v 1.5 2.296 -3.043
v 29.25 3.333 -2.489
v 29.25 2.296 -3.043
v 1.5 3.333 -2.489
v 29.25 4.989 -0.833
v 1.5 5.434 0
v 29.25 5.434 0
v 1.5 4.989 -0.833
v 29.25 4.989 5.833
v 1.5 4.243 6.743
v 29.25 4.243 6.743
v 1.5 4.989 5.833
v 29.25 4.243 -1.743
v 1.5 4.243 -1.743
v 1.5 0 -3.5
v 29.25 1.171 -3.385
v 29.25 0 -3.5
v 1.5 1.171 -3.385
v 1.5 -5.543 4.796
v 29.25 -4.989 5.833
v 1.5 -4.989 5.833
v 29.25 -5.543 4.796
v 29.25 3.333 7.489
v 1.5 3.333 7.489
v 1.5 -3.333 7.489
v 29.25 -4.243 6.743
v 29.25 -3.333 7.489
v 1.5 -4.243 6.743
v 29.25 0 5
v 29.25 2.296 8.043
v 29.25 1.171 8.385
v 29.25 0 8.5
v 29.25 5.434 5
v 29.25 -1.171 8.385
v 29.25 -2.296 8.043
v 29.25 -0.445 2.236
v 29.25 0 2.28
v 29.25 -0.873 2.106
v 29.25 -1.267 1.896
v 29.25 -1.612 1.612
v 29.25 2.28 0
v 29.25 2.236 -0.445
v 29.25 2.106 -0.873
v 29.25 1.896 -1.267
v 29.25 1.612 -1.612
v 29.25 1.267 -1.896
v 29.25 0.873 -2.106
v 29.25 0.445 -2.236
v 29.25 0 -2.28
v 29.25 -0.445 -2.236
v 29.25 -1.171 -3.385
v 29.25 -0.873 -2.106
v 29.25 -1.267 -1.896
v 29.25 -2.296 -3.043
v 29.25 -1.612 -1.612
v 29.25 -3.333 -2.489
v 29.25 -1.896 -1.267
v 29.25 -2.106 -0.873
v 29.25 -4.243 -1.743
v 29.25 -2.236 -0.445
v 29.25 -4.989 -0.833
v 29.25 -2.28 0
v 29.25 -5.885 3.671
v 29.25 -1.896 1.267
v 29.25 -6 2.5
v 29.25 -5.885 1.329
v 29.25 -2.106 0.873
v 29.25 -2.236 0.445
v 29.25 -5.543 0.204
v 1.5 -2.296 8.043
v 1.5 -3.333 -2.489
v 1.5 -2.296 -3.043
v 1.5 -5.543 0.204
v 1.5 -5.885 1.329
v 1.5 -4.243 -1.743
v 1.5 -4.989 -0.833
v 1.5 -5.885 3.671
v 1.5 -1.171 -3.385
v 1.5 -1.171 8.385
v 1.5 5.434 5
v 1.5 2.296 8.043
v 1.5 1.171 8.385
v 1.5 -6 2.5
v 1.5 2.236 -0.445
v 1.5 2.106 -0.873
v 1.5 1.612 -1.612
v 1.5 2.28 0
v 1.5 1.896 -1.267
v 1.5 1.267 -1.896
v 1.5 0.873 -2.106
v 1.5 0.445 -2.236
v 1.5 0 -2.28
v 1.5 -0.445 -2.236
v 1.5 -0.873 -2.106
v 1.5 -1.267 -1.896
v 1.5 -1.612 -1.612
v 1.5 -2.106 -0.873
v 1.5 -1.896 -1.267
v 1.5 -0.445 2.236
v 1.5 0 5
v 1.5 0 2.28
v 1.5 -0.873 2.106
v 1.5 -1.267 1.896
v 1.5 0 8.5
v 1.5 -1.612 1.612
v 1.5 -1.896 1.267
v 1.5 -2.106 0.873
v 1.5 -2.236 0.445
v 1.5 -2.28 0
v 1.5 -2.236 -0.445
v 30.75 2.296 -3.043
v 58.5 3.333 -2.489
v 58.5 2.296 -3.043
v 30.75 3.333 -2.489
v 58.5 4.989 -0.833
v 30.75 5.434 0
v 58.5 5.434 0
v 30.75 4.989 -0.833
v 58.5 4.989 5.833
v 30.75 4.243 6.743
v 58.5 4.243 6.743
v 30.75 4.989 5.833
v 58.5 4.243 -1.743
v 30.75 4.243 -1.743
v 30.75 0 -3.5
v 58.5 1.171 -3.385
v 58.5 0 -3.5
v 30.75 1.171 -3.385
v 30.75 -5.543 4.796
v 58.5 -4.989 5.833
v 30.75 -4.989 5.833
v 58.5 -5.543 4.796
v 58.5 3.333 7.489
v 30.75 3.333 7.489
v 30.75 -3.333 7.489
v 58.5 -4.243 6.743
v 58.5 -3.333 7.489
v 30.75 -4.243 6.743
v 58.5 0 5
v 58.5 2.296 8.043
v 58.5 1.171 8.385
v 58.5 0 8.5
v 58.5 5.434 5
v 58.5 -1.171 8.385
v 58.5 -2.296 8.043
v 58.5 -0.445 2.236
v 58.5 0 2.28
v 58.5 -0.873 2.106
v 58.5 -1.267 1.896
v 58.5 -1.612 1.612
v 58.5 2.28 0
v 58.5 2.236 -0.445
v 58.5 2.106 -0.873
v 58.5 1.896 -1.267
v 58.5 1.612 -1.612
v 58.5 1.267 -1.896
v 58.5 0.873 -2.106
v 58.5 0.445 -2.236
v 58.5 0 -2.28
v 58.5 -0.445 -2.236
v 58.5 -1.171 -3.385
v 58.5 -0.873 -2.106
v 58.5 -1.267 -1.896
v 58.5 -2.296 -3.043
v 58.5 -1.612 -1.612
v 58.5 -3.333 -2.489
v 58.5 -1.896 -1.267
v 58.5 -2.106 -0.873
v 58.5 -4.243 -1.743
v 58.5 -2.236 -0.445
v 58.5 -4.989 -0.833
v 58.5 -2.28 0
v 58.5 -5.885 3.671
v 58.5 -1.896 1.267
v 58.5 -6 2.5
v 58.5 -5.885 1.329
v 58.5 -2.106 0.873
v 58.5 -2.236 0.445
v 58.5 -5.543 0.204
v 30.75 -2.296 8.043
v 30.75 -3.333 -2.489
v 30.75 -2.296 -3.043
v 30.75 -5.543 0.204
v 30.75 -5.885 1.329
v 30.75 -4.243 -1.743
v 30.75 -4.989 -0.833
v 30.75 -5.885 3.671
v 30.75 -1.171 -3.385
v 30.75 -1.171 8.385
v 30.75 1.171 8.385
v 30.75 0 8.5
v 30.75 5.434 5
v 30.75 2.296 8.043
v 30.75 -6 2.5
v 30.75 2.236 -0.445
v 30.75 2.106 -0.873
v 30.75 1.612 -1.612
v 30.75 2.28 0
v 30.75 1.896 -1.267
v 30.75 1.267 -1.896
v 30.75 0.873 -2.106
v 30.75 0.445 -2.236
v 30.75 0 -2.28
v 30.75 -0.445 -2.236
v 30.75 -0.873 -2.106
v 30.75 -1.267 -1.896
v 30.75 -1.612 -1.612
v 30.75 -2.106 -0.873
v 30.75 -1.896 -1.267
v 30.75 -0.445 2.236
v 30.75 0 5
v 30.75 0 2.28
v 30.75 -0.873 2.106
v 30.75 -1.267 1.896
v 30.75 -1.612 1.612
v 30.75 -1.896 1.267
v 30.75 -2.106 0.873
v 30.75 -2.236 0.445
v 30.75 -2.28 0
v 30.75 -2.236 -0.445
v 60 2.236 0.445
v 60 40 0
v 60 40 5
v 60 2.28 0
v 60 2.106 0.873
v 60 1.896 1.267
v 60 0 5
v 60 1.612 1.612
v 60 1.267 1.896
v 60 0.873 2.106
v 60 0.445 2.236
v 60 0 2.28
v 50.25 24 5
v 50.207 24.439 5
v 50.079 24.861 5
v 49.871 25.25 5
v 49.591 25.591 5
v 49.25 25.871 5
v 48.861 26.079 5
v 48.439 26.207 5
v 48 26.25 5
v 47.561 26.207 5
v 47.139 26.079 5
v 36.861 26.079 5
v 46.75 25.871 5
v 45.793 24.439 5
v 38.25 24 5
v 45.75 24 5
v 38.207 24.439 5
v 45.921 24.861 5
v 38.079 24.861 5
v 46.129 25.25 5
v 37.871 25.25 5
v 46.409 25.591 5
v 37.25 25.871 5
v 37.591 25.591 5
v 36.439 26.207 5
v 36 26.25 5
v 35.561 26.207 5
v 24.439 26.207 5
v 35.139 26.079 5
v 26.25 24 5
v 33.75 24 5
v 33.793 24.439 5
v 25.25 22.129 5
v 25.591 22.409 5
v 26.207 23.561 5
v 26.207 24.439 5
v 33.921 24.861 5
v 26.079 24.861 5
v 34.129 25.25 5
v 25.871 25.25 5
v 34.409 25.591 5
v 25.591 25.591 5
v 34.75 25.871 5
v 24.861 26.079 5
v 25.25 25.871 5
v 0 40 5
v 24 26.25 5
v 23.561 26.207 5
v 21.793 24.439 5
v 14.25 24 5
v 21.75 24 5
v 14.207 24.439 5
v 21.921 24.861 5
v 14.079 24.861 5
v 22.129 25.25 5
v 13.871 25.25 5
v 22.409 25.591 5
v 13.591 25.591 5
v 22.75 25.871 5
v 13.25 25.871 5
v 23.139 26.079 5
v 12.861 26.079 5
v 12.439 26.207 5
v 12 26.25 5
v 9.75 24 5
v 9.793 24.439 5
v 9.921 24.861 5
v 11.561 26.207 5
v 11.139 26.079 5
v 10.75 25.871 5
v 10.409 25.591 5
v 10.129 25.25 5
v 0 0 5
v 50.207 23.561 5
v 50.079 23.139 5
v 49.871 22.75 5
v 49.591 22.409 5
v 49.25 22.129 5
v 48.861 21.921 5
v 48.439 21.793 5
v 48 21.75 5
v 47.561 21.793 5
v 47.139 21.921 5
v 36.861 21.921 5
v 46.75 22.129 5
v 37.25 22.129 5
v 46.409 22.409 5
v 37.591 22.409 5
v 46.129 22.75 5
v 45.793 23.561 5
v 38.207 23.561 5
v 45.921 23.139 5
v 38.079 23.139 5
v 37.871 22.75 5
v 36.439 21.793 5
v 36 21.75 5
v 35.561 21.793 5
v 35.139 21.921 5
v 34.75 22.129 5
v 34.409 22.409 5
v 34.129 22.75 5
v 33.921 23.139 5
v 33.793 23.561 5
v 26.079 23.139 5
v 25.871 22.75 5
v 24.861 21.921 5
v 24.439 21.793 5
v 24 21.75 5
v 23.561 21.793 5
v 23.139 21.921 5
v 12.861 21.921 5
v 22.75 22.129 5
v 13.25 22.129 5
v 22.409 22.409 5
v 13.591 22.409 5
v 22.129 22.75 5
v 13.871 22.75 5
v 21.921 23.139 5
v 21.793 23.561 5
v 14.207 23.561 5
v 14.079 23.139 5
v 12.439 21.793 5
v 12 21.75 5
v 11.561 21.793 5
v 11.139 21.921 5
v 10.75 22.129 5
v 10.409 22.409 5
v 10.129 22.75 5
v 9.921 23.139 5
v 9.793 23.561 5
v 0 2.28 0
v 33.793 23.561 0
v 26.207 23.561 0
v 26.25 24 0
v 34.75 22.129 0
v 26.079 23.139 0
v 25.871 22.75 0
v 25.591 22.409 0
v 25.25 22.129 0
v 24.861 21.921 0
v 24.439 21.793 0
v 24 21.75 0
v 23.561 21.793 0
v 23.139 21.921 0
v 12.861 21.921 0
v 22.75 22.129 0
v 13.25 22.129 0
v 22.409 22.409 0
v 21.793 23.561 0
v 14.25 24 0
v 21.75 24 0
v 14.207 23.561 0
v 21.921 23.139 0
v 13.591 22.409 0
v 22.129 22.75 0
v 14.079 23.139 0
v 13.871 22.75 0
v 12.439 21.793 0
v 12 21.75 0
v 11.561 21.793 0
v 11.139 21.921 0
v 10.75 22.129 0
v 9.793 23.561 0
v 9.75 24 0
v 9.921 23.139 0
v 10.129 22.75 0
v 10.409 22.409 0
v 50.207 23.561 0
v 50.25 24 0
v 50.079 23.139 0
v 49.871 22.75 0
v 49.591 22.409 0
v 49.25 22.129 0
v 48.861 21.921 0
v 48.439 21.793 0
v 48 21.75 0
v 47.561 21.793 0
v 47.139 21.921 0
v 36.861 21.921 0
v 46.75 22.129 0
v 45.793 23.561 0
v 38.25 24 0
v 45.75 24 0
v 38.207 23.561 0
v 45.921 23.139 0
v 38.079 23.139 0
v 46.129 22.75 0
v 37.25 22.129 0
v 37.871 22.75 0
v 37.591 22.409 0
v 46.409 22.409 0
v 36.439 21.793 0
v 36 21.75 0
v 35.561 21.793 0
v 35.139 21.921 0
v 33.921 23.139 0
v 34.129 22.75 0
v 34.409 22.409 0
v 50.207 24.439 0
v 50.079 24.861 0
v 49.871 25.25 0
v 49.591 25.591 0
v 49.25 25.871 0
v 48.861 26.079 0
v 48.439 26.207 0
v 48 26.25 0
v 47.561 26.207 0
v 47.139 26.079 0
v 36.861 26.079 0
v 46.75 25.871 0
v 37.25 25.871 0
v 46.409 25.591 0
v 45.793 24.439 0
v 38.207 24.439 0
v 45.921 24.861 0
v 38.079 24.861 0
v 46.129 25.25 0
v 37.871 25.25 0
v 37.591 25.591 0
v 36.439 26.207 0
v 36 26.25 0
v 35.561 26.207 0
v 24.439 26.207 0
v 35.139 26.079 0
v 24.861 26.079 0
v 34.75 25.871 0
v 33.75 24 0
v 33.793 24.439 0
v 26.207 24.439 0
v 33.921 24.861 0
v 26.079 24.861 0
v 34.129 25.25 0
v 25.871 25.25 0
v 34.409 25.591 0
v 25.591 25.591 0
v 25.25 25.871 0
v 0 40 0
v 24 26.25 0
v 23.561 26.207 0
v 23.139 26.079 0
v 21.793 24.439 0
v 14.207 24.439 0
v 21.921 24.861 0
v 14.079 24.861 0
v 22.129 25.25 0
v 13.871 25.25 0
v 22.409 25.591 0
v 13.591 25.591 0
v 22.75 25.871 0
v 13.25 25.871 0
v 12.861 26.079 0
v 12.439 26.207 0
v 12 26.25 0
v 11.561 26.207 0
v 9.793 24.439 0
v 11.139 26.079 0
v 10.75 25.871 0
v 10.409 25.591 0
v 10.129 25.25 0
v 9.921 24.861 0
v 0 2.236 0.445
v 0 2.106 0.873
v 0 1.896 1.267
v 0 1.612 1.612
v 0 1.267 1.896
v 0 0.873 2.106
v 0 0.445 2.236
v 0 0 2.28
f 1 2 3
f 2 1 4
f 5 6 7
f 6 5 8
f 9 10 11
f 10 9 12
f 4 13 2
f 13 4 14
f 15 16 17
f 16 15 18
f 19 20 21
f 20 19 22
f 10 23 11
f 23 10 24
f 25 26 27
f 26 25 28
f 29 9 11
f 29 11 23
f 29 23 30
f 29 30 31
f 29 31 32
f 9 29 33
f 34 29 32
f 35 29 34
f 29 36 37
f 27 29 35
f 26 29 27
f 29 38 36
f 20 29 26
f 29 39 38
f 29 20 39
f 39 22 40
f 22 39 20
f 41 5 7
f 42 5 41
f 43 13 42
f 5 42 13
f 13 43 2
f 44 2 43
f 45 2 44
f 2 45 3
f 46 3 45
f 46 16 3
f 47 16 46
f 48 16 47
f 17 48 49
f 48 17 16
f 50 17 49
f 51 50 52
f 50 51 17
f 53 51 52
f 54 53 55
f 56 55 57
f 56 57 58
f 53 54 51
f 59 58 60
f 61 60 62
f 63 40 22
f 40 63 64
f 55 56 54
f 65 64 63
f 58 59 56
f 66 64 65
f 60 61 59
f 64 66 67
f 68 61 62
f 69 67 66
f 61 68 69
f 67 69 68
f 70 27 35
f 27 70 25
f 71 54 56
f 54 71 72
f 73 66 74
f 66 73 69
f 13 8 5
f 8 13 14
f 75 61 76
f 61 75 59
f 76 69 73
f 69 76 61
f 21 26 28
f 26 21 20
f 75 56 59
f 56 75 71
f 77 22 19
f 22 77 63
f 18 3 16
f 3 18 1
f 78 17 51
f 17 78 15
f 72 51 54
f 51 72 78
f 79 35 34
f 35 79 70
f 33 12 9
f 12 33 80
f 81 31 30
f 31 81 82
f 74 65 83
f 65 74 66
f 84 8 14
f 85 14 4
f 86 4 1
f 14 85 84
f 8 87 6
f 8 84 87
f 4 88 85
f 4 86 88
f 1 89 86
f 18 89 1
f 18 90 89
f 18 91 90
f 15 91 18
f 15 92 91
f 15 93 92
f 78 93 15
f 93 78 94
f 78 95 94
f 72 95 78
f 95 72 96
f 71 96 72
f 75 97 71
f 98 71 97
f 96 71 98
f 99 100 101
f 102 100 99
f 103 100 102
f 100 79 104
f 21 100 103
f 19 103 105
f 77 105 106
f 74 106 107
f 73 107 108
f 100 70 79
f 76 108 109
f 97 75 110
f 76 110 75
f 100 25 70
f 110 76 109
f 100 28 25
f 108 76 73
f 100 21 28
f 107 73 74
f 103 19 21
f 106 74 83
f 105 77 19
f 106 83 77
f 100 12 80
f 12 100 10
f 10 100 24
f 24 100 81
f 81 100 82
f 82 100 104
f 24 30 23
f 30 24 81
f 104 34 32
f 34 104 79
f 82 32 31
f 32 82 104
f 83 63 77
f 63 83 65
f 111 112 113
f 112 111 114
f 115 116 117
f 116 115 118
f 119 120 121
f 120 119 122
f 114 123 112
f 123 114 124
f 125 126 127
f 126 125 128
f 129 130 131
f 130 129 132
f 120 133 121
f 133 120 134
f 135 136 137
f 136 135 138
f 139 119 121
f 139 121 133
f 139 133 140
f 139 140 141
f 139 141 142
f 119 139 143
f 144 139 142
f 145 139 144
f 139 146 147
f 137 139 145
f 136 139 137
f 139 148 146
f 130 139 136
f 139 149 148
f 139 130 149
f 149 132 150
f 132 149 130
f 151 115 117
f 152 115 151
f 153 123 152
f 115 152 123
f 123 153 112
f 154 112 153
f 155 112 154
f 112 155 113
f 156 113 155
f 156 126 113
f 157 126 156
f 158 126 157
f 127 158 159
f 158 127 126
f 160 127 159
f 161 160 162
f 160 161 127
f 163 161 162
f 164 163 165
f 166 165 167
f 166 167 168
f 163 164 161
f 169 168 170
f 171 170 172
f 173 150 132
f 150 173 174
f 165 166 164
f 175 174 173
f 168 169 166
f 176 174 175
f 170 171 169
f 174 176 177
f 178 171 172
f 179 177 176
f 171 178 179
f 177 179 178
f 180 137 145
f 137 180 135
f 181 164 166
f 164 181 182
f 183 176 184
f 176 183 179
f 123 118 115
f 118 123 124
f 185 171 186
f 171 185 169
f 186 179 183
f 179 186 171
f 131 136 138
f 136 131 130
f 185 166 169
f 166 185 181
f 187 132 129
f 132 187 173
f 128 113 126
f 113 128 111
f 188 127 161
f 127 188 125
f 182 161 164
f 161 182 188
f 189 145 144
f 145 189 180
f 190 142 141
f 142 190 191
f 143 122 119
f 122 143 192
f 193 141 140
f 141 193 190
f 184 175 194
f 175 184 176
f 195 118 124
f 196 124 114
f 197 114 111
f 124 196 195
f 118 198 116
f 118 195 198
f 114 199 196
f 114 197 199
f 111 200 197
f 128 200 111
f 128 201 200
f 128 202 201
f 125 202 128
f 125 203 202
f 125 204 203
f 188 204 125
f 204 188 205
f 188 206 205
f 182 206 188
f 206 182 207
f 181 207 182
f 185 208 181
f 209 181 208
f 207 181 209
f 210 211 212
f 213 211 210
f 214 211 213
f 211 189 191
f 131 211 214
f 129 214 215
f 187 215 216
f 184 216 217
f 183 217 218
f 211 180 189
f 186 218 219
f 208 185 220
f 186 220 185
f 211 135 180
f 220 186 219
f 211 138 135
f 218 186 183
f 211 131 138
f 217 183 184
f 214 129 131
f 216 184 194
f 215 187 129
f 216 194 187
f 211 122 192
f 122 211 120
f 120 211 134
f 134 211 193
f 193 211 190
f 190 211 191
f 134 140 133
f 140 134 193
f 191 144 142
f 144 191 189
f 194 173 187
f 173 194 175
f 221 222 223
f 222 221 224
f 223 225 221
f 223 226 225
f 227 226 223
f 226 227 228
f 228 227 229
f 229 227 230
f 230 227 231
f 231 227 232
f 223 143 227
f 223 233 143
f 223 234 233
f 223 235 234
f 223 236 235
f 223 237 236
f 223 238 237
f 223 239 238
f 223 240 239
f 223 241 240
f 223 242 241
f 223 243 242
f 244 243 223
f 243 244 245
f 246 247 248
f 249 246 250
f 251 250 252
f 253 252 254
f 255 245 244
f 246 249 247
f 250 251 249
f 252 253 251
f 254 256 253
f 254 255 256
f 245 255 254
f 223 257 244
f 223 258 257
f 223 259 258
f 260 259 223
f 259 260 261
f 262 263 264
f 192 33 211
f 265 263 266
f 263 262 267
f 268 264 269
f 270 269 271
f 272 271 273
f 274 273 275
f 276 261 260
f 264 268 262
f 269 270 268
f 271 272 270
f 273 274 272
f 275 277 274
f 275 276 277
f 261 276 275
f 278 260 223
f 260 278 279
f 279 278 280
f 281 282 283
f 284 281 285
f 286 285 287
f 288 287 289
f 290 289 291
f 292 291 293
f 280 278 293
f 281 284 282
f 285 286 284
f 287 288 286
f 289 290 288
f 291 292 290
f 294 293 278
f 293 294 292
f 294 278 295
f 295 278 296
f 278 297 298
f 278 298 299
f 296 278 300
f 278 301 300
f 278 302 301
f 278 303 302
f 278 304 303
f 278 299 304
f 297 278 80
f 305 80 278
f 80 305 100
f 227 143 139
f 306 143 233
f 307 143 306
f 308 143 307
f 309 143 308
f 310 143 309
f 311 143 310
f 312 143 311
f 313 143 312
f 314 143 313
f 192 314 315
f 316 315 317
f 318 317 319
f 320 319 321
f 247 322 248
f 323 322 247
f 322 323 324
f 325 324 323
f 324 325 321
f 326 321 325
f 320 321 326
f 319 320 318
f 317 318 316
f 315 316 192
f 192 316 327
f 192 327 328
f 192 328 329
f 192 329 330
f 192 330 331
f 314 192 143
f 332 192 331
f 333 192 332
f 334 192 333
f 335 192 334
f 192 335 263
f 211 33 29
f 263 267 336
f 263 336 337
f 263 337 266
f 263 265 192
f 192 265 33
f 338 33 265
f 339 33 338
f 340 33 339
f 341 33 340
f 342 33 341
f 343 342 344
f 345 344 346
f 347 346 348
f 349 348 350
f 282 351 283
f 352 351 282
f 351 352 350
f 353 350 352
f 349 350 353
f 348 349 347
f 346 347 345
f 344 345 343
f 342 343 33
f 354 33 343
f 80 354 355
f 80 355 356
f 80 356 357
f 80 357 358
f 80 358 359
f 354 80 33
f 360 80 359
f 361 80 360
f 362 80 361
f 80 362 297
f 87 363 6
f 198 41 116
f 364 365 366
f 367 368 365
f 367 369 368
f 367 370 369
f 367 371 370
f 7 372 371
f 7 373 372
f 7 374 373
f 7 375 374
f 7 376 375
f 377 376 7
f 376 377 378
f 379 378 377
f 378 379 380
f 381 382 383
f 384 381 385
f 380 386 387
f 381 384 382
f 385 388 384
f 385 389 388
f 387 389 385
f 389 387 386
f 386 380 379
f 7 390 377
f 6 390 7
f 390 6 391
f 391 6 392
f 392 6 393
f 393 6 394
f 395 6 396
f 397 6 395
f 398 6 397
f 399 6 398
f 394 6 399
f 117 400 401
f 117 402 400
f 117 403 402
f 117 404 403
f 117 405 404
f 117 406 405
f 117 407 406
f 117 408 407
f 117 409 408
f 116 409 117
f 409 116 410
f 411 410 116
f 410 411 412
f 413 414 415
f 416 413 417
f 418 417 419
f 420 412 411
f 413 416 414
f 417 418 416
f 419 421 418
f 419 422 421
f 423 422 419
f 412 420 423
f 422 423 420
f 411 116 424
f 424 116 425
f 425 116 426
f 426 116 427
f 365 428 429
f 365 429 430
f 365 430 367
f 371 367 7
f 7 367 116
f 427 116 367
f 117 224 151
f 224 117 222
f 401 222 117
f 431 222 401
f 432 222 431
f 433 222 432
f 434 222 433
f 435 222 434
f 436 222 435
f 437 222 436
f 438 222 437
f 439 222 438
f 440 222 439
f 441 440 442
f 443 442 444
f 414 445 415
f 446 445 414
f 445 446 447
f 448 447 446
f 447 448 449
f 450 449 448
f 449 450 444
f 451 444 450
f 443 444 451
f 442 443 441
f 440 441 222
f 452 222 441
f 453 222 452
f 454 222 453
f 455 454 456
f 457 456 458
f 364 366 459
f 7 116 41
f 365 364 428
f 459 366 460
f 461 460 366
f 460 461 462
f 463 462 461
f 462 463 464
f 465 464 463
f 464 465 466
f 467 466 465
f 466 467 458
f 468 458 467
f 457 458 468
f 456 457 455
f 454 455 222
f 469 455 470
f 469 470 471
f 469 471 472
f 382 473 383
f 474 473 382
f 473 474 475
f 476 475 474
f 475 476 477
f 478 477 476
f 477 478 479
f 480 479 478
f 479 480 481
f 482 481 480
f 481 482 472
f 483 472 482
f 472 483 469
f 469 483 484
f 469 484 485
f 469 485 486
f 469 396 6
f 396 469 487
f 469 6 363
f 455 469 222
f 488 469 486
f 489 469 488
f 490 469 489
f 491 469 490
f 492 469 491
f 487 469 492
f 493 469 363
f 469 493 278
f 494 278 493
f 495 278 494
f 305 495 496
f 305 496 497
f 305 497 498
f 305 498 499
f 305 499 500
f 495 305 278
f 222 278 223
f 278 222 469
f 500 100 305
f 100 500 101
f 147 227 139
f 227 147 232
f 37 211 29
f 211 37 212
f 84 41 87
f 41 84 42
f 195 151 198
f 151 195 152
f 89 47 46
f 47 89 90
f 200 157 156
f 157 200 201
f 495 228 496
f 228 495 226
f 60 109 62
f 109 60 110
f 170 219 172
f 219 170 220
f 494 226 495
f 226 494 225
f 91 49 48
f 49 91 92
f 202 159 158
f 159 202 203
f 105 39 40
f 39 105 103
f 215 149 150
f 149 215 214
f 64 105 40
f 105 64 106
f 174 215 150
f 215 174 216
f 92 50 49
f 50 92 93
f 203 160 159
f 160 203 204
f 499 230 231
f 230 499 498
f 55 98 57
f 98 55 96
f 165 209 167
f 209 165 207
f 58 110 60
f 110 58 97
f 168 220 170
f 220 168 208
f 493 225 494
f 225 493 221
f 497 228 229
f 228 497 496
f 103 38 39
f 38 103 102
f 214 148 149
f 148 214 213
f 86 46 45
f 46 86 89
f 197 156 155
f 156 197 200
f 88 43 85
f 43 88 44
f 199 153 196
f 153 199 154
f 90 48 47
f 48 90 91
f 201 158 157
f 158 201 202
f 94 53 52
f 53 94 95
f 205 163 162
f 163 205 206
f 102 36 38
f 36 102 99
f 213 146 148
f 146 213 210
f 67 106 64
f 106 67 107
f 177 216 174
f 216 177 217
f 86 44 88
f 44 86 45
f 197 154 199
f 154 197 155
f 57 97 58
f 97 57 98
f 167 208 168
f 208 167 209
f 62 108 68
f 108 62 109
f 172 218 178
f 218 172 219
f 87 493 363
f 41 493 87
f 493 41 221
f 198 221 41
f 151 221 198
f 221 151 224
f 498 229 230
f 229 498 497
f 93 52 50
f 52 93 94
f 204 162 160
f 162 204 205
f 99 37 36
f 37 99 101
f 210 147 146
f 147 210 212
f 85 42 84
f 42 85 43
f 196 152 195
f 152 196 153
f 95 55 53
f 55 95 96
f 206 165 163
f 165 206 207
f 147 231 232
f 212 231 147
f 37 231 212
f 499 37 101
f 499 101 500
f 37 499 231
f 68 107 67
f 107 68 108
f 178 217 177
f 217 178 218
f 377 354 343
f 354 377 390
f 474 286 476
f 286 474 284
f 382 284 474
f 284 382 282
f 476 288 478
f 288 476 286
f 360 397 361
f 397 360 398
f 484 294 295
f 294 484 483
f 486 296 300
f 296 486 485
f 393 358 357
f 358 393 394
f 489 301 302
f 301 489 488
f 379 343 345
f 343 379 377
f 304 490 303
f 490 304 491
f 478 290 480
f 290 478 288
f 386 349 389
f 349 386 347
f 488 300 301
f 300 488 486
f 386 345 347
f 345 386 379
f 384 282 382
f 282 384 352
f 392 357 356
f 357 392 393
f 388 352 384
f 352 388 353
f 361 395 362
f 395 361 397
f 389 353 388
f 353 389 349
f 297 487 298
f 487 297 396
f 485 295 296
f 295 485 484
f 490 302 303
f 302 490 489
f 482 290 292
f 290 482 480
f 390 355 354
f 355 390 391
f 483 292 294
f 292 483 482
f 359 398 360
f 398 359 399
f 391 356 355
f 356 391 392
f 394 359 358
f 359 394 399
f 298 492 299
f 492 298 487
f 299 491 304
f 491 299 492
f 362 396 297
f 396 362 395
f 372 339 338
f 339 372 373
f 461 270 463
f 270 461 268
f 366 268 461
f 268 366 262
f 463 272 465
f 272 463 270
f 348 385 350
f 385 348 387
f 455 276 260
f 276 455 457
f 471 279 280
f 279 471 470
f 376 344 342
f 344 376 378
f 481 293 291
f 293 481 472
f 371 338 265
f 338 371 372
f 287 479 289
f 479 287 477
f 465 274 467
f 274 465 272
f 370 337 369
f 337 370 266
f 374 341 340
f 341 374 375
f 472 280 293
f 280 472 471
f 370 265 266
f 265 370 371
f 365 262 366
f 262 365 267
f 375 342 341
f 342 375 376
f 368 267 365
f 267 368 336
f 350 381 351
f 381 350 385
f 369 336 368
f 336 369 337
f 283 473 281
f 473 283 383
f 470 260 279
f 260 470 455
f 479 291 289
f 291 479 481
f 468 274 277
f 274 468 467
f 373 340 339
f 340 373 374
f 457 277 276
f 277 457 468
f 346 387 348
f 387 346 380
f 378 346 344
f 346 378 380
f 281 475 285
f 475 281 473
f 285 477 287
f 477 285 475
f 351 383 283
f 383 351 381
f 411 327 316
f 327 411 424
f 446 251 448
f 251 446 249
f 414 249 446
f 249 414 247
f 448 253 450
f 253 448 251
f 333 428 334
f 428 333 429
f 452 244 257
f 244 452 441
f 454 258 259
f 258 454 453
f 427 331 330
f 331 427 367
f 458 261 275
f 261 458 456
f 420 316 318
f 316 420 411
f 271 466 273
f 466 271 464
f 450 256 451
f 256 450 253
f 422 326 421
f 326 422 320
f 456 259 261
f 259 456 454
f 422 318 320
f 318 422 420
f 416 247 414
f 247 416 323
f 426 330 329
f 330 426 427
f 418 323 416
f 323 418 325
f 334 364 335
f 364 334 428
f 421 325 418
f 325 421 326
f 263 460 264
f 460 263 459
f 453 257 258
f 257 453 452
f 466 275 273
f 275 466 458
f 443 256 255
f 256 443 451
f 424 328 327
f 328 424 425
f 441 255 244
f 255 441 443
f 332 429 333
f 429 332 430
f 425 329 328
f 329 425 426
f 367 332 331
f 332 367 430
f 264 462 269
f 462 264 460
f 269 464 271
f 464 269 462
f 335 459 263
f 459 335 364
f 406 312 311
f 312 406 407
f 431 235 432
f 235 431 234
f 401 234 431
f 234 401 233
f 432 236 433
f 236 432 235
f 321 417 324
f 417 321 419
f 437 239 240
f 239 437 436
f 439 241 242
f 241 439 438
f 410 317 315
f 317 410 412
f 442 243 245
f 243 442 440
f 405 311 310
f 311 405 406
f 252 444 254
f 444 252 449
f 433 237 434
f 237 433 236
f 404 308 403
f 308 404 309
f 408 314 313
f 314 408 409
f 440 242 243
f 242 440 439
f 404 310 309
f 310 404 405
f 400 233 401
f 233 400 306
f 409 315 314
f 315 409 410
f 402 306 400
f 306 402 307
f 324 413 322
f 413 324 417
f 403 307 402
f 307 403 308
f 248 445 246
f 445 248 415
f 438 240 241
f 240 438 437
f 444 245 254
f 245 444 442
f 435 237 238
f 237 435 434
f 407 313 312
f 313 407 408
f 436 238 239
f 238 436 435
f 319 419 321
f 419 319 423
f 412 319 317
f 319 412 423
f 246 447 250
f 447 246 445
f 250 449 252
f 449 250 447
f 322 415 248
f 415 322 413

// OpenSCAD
$fn = 32;

// ----------------------------------------------------------------------
// Hinge leaf: 60 x 46 x 12 mm
// ----------------------------------------------------------------------

// --- parameters (mm) ---
tab_len = 60;             // leaf length, X
tab_w = 40;               // leaf width, Y
tab_t = 5;                // leaf thickness
ring_d = 12;              // knuckle diameter
ring_w = 27.75;           // knuckle width
knuckle_n = 2;            // number of knuckles
pin_d = 4.56;             // pin bore
gap = 1.5;                // gap between the knuckles
screw_d = 4.5;            // screw clearance

module leaf() {
  cube([tab_len, tab_w, tab_t]);
}

module knuckles() {
  /* barrels sit on the leaf edge, the pin axis at half the leaf thickness */
  for (i = [0 : knuckle_n - 1])
    translate([gap + i * (ring_w + gap), 0, tab_t * 0.5])
      rotate([0, 90, 0]) cylinder(h = ring_w, d = ring_d);
}

difference() {
  union() {
    leaf();
    knuckles();
  }
  rotate([0, 90, 0]) translate([0, 0, -1])
    cylinder(h = tab_len + 2, d = pin_d);
  translate([12, tab_w * 0.6, -1]) cylinder(h = tab_t + 2, d = screw_d);
  translate([24, tab_w * 0.6, -1]) cylinder(h = tab_t + 2, d = screw_d);
  translate([36, tab_w * 0.6, -1]) cylinder(h = tab_t + 2, d = screw_d);
  translate([48, tab_w * 0.6, -1]) cylinder(h = tab_t + 2, d = screw_d);
}
